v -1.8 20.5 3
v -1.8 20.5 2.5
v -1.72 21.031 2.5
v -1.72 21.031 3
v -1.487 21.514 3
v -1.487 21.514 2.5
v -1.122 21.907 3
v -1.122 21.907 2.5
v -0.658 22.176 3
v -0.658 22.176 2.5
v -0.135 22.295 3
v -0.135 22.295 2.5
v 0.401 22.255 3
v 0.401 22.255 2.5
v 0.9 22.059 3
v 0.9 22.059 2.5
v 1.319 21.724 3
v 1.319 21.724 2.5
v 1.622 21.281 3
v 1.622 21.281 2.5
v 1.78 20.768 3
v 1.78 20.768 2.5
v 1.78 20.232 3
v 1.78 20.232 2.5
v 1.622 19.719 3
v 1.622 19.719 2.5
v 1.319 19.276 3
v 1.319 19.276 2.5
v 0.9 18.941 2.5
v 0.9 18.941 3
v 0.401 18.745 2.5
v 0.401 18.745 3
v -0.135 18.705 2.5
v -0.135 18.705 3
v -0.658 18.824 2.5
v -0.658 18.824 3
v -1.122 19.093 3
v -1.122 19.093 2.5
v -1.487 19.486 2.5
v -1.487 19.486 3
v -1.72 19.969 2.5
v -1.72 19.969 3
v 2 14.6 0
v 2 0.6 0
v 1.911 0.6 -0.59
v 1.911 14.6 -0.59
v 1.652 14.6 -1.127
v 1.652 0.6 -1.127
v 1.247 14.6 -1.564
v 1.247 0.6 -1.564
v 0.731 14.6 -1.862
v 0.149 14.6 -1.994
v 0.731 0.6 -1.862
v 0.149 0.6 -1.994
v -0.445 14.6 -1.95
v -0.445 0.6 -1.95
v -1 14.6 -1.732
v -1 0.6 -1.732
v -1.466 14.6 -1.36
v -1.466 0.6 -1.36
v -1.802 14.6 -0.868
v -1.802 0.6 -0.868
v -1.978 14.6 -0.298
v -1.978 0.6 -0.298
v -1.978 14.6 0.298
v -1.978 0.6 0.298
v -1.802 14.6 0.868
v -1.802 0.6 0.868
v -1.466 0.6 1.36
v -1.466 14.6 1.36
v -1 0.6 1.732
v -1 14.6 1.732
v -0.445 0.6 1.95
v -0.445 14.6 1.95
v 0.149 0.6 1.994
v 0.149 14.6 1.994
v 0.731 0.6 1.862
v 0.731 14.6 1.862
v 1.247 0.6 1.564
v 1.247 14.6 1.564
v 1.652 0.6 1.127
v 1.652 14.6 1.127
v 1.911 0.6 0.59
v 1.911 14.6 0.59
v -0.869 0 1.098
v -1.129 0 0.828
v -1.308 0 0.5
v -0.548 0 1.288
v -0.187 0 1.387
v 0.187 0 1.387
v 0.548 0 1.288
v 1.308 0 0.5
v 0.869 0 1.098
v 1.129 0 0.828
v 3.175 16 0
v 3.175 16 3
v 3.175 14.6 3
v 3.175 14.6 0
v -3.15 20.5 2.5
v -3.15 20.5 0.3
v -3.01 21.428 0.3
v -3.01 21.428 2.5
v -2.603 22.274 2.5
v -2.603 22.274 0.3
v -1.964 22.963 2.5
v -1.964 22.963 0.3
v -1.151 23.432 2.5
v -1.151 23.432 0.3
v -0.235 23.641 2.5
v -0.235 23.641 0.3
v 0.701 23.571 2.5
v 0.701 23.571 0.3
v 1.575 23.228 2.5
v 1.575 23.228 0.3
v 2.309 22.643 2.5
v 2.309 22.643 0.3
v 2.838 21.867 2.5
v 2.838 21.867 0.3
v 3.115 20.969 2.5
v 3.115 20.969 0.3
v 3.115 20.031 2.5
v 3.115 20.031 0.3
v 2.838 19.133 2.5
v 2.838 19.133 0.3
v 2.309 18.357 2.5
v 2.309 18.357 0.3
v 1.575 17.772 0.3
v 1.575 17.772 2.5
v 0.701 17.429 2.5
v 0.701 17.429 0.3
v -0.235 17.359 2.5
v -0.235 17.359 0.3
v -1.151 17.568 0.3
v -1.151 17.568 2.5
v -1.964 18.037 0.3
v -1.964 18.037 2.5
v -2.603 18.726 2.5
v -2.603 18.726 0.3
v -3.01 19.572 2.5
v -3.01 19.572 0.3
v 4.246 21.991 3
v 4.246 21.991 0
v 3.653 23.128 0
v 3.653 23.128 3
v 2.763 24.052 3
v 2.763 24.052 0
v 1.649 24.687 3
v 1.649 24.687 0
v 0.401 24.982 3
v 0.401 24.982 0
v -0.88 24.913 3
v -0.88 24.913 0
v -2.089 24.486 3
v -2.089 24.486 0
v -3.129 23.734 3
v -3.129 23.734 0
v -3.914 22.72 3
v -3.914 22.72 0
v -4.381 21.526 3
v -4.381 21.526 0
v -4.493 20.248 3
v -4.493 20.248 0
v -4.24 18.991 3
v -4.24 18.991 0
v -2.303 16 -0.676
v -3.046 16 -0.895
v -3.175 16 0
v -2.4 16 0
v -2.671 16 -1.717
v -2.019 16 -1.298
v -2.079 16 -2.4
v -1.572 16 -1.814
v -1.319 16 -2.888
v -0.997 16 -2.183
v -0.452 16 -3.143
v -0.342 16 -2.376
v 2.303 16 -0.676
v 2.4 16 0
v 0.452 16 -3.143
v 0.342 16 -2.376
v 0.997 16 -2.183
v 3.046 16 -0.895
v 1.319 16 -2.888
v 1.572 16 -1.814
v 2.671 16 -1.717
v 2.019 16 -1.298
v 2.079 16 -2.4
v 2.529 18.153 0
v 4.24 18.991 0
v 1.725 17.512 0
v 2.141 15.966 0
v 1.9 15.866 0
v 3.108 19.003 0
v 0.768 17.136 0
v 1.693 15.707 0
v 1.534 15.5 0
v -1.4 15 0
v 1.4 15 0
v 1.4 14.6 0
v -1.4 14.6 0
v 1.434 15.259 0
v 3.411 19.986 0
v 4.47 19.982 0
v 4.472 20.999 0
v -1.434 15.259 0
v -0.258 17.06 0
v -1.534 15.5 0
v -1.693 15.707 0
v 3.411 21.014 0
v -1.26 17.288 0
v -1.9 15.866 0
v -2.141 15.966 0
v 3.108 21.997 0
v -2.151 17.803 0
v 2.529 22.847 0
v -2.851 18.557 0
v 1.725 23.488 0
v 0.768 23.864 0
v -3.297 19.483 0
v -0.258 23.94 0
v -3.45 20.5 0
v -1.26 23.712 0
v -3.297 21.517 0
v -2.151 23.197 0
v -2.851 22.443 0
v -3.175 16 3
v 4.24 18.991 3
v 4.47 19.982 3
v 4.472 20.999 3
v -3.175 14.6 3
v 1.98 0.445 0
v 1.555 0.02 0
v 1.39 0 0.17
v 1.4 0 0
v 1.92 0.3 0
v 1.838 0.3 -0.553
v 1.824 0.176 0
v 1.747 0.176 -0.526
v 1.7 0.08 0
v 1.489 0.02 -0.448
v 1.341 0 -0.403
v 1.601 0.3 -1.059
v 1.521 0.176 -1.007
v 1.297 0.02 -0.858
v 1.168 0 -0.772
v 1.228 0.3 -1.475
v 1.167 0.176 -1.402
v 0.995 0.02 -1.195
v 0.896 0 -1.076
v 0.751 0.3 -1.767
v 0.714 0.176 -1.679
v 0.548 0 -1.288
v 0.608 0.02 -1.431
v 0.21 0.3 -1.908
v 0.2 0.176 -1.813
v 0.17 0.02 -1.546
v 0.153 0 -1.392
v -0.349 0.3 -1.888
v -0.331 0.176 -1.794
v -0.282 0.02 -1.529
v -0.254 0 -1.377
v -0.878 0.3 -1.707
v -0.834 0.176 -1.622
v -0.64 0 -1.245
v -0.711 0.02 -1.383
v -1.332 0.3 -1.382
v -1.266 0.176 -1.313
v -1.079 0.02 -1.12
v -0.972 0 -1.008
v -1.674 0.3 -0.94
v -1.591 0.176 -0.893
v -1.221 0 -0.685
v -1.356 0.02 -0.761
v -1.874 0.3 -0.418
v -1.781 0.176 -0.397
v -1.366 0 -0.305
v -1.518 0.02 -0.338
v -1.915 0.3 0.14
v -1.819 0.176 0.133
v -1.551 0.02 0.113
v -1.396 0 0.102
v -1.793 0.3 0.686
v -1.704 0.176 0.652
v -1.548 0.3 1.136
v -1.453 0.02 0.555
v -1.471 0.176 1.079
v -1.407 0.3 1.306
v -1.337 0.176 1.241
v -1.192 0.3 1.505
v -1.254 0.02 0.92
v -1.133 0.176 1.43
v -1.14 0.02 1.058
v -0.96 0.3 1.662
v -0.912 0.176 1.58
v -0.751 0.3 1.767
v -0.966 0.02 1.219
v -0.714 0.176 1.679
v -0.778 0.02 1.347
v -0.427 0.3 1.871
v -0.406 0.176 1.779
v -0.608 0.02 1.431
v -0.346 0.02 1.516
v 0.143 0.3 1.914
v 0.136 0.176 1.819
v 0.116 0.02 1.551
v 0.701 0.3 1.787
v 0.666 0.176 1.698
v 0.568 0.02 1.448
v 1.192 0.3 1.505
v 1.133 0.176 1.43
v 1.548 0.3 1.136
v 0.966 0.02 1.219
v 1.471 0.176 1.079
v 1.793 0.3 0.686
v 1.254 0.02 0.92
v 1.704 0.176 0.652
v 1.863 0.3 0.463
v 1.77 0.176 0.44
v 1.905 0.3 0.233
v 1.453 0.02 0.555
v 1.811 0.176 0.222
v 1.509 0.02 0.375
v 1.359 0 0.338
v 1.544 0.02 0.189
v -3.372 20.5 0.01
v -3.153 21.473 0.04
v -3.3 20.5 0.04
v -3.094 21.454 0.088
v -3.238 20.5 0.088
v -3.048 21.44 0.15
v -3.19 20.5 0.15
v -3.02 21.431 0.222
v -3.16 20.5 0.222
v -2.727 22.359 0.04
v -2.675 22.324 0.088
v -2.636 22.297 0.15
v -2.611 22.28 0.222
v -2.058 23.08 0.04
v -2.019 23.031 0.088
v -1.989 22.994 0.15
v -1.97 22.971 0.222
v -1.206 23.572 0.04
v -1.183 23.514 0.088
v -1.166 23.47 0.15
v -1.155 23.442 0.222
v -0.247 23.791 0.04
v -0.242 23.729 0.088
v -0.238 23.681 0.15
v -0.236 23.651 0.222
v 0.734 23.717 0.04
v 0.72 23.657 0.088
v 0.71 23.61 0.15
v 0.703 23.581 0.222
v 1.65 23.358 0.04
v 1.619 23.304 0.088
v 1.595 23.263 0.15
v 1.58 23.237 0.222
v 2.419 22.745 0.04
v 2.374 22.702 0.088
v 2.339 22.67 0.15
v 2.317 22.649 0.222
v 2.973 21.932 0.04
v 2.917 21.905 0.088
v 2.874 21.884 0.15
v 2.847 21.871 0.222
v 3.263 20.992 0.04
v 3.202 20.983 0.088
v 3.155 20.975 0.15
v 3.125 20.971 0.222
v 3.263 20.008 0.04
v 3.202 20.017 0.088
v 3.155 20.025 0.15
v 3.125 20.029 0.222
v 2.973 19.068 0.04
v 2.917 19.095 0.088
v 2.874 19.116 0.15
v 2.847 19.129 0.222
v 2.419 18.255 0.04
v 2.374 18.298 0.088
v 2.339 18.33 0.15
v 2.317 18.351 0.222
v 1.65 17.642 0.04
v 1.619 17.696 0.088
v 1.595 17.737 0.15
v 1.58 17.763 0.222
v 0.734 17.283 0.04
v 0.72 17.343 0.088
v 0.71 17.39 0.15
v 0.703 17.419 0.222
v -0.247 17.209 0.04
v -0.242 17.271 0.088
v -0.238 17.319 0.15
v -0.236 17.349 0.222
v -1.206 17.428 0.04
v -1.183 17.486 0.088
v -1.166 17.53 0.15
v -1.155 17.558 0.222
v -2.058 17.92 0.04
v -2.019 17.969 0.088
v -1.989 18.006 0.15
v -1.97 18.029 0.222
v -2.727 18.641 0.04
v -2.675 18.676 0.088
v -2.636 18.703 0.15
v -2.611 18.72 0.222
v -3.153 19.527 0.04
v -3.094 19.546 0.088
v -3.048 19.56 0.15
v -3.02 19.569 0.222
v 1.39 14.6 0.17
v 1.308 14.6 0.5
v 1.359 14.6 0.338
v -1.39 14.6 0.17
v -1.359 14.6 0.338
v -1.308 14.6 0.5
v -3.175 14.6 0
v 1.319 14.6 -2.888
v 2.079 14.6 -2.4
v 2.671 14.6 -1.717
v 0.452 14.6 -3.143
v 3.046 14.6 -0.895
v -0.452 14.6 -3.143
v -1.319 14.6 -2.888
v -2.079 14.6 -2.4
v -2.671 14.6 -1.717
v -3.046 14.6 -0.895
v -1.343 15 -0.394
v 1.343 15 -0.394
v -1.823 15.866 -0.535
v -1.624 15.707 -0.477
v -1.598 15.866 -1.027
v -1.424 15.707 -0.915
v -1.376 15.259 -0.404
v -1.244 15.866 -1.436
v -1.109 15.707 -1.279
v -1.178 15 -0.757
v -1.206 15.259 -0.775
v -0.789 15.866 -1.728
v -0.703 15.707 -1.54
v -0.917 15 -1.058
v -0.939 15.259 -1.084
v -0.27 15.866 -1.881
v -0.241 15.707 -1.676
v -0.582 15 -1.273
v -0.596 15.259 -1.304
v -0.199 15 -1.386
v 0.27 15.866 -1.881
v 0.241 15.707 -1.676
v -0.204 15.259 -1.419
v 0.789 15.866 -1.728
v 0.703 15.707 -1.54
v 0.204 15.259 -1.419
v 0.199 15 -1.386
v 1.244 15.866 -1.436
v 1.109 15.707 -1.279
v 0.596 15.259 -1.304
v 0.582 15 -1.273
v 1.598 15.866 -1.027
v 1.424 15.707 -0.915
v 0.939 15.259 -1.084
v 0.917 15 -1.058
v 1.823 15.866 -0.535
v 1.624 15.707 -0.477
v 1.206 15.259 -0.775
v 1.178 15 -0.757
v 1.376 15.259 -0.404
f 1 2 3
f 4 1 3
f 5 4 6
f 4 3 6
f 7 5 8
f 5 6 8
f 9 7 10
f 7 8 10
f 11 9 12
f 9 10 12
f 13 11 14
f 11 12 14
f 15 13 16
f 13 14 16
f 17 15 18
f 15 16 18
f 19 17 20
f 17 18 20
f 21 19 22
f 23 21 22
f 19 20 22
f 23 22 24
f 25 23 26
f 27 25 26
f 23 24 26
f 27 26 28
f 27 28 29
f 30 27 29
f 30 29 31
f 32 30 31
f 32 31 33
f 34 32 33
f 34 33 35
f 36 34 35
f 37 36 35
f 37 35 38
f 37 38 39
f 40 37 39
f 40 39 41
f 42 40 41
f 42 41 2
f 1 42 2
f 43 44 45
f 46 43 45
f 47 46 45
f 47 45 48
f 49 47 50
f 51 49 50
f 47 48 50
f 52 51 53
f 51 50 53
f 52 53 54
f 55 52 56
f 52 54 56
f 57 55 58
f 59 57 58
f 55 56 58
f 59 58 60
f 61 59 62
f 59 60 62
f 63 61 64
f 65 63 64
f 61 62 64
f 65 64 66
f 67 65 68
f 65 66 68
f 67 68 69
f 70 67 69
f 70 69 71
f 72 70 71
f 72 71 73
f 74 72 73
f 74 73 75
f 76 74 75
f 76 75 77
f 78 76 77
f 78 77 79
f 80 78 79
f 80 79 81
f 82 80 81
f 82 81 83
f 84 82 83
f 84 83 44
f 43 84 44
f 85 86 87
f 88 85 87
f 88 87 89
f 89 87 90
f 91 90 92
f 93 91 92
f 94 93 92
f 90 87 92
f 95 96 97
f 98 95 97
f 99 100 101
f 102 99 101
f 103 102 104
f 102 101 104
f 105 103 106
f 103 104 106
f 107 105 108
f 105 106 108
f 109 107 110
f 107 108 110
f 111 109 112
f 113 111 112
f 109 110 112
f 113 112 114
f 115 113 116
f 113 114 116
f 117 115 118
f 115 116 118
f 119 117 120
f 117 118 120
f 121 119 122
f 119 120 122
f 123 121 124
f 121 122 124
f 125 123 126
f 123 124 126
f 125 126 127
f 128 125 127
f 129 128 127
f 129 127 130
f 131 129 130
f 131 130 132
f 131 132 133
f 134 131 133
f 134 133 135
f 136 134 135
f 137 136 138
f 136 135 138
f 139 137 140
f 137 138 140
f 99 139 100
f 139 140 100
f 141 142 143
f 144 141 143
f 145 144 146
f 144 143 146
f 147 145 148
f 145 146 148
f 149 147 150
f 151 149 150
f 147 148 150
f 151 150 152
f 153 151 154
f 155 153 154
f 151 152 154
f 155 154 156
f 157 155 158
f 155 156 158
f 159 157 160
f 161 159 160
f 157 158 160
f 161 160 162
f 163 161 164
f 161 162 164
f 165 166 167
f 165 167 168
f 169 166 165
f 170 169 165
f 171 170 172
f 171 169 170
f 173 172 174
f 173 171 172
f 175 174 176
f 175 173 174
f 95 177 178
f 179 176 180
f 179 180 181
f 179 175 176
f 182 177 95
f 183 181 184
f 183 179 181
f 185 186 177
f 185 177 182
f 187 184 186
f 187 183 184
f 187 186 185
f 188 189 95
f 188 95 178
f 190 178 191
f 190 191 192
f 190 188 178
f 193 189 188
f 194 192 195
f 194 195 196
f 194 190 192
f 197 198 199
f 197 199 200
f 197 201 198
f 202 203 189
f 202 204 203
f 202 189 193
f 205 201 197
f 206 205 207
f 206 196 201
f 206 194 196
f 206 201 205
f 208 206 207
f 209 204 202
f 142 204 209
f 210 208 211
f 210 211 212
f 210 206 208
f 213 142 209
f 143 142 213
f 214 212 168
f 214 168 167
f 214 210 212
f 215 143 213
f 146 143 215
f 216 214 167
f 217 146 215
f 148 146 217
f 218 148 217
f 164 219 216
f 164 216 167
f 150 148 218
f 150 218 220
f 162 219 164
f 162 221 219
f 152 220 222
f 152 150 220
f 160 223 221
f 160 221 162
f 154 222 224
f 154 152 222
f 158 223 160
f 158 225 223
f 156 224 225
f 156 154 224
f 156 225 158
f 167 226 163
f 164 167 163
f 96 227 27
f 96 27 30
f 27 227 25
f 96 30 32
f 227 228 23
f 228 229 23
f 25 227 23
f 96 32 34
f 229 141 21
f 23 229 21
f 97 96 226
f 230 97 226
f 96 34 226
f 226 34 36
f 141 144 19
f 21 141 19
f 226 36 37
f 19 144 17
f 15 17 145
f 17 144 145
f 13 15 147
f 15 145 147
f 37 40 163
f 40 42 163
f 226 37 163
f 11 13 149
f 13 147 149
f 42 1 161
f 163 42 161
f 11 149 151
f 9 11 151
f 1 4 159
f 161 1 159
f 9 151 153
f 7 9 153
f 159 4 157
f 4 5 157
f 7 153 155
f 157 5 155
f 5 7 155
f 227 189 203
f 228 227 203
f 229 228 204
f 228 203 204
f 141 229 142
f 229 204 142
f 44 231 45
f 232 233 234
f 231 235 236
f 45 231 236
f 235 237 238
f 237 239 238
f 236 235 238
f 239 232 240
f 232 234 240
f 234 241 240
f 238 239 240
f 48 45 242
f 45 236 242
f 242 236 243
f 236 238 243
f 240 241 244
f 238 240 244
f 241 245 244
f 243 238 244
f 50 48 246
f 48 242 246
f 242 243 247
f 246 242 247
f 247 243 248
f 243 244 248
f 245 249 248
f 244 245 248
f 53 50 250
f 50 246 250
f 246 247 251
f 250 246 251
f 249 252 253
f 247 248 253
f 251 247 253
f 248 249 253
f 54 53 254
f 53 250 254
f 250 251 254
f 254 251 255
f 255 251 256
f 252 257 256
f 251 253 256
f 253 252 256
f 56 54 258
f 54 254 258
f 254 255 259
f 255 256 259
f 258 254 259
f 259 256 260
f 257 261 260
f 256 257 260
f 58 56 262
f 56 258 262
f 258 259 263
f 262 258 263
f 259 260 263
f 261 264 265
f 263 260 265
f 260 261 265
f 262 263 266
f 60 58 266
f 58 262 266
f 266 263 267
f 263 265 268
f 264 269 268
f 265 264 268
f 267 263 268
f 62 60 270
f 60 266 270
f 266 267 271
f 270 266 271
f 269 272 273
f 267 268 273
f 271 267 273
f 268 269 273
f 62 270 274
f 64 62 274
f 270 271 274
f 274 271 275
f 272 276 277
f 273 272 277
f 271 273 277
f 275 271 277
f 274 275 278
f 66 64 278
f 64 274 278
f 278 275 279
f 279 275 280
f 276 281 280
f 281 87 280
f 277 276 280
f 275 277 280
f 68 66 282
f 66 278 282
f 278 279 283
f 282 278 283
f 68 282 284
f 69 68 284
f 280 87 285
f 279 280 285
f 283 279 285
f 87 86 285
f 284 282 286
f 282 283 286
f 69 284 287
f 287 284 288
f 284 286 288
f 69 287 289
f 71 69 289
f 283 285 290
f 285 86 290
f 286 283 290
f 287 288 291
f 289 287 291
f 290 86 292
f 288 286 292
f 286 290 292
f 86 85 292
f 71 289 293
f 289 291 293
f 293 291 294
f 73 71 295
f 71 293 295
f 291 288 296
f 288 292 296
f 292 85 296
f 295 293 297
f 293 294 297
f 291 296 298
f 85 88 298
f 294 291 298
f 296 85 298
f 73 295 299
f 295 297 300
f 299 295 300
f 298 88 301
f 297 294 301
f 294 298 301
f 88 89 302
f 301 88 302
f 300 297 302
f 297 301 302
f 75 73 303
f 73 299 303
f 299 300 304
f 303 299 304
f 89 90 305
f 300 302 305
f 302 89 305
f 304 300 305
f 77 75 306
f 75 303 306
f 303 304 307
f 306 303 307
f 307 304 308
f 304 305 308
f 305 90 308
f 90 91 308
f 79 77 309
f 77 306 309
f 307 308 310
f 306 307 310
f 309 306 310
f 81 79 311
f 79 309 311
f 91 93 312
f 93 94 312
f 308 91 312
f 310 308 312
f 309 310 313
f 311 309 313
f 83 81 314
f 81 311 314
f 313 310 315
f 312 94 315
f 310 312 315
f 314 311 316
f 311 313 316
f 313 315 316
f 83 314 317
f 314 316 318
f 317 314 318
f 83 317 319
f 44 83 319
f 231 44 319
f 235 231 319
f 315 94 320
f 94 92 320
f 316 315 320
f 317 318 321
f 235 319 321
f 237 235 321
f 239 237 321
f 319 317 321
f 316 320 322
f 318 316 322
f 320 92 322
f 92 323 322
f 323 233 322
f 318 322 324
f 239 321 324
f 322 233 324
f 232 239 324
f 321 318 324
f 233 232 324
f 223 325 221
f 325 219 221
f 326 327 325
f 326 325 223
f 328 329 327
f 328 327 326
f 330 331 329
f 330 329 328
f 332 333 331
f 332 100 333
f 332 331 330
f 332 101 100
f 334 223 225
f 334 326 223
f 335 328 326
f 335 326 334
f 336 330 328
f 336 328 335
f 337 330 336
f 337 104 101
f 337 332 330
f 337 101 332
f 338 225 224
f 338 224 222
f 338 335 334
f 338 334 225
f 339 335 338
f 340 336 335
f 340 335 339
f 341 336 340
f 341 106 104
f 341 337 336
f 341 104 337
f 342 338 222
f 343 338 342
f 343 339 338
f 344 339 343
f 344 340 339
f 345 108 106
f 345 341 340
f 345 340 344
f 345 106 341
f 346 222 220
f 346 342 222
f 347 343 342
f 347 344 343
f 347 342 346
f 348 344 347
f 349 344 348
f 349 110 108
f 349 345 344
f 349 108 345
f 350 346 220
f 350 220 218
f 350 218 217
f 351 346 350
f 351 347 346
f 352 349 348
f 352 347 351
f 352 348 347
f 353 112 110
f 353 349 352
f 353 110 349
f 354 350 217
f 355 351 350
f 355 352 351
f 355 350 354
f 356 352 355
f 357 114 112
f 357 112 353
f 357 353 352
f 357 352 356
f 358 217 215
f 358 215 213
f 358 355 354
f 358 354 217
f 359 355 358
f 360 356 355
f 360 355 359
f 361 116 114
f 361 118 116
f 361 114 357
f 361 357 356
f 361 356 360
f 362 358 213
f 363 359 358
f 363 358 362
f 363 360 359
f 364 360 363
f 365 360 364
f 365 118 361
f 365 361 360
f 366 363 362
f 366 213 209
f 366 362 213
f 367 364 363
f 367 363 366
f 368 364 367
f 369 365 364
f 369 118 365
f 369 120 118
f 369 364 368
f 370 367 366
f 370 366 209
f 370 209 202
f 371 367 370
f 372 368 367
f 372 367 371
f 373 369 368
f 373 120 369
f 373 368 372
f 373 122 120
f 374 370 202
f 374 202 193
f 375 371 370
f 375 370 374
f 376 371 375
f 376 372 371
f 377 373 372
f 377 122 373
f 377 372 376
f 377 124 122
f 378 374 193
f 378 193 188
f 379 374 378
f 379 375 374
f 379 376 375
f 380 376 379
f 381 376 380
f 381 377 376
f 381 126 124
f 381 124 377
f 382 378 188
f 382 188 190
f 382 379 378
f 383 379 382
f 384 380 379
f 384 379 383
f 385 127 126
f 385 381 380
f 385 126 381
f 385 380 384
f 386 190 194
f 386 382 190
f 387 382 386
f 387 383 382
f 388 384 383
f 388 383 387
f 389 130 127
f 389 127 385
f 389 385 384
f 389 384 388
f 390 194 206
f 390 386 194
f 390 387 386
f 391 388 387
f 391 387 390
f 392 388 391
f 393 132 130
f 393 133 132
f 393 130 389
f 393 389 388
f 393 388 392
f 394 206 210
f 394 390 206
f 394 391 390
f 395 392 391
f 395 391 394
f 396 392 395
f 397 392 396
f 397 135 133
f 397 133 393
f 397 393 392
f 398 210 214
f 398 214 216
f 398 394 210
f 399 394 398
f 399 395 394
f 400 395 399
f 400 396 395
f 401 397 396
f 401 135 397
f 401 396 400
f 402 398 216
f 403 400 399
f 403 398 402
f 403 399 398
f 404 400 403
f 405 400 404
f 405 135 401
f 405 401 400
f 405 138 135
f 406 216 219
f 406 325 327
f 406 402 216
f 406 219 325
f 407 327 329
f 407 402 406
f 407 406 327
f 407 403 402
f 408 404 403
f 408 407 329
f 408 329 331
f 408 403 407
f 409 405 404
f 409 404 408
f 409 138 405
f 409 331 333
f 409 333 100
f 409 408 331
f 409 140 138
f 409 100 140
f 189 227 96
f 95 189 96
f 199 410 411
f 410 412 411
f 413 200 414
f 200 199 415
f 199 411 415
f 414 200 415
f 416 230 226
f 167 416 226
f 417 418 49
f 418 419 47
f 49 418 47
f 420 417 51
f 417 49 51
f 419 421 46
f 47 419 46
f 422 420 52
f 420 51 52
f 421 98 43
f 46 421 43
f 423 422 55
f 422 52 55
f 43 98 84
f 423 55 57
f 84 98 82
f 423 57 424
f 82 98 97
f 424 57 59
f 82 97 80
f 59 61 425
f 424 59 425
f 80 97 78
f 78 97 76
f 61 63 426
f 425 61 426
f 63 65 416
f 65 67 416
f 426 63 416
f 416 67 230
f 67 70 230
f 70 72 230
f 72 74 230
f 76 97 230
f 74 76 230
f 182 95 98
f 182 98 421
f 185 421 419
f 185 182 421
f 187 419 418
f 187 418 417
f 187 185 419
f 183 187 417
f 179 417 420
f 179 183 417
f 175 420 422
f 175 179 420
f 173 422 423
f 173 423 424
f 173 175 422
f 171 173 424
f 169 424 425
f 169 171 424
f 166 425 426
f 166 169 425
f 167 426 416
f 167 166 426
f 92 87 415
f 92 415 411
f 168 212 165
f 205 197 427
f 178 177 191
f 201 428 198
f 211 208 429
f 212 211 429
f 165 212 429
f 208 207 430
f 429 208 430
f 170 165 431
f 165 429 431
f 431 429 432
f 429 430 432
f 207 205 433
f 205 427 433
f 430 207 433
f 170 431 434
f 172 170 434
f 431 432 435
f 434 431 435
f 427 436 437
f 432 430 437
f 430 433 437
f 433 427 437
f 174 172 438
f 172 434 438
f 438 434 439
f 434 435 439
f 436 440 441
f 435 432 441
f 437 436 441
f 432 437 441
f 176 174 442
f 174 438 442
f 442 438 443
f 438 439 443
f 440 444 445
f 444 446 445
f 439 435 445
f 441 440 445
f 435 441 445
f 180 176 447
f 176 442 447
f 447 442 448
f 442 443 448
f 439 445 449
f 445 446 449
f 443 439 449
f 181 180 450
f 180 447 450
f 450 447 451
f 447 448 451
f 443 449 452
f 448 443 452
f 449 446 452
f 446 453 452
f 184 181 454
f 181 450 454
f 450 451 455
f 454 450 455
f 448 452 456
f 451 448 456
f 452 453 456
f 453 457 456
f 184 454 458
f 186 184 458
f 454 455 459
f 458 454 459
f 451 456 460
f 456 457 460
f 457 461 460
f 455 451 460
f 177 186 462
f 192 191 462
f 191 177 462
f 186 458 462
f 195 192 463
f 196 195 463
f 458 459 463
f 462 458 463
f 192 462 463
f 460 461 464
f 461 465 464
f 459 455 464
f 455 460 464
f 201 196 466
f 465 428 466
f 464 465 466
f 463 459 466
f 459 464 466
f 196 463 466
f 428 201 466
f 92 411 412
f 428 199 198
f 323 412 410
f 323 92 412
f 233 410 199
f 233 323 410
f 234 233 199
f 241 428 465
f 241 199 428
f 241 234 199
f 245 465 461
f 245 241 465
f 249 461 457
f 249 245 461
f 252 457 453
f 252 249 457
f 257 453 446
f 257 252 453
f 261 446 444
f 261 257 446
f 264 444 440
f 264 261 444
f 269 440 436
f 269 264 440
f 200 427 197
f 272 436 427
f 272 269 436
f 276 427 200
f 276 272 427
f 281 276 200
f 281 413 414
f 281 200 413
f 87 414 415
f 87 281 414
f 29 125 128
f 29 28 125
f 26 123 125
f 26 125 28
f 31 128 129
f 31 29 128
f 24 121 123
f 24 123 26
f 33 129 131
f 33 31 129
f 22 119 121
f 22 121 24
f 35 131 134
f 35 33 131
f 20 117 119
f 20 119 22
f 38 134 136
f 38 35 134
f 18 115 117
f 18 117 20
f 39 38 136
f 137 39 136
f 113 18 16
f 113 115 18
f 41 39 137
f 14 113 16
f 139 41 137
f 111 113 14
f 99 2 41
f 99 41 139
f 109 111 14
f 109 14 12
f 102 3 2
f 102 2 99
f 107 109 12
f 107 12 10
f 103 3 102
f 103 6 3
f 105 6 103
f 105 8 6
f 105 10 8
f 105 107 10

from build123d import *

# Parameters (mm, degrees)
SKETCH_1_R               = 2
EXTRUDE_1_DEPTH          = 16
EXTRUDE_2_DEPTH          = 3
SKETCH_4_R               = 3.15
CUT_EXTRUDE_6_DEPTH      = 2.5
FILLET_3_R               = 0.6
SKETCH_7_R               = 3.175
EXTRUDE_3_DEPTH          = 1.4
CUT_EXTRUDE_9_DEPTH      = 1
CUT_EXTRUDE_9_DEPTH_BACK = 26
FILLET_6_R               = 1
EXTRUDE_5_DEPTH          = 3
FILLET_7_R               = 0.3
CUT_EXTRUDE_10_REACH     = 2.675
SKETCH_13_R              = 1.8
CUT_EXTRUDE_11_REACH     = 18
SKETCH_14_W              = 2.079062288
SKETCH_14_H              = 0.49177122


with BuildPart() as part:
    # 草图1 → 凸台-拉伸1 (new body)
    with BuildSketch(Plane(origin=(0, 0, 0), x_dir=(1, 0, 0), z_dir=(0, 1, 0))):
        Circle(SKETCH_1_R)
    extrude(amount=EXTRUDE_1_DEPTH)

    # 圆角3
    fillet_3_edges = [part.edges().sort_by_distance(p)[0] for p in [
        (-2, 0, 0),
    ]]
    fillet(fillet_3_edges, radius=FILLET_3_R)

    # 草图7 → 凸台-拉伸3 (add)
    with BuildSketch(Plane(origin=(0, 16, 0), x_dir=(1, 0, 0), z_dir=(0, 1, 0))):
        Circle(SKETCH_7_R)
    extrude(amount=-EXTRUDE_3_DEPTH)

    # 草图10 → 切除-拉伸9 (cut, two sides)
    with BuildSketch(Plane.XZ) as cut_extrude_9_sk:
        with BuildLine():
            Line((-1.307669683, 0.5), (1.307669683, 0.5))
            ThreePointArc((1.307669683, 0.5), (0, -1.4), (-1.307669683, 0.5))
        make_face()
    extrude(amount=CUT_EXTRUDE_9_DEPTH, mode=Mode.SUBTRACT)
    extrude(cut_extrude_9_sk.sketch, amount=-CUT_EXTRUDE_9_DEPTH_BACK, mode=Mode.SUBTRACT)

    # 圆角6
    fillet_6_edges = [part.edges().sort_by_distance(p)[0] for p in [
        (0, 16, -1.4),
    ]]
    fillet(fillet_6_edges, radius=FILLET_6_R)



with BuildPart() as body_2:
    # 草图2 → 凸台-拉伸2 (new body)
    with BuildSketch(Plane.XY):
        with BuildLine():
            ThreePointArc((4.245738578, 21.991208882), (-3.671541908, 23.101880092), (0, 16))
            ThreePointArc((0, 16), (3.671541908, 17.898119908), (4.245738578, 21.991208882))
        make_face()
    extrude(amount=EXTRUDE_2_DEPTH)

    # 草图4 → 切除-拉伸6 (cut)
    with BuildSketch(Plane(origin=(0, 0, 0), x_dir=(-1, 0, 0), z_dir=(0, 0, -1))):
        with Locations((0, 20.5)):
            Circle(SKETCH_4_R)
    extrude(amount=-CUT_EXTRUDE_6_DEPTH, mode=Mode.SUBTRACT)


with BuildPart() as part_1:
    add(part.part)

    add(body_2.part)  # 凸台-拉伸5 merges body 2
    # 草图12 → 凸台-拉伸5 (add)
    with BuildSketch(Plane.XY.offset(3)):
        with BuildLine():
            Line((-3.175, 16), (-4.239526881, 18.991221744))
            ThreePointArc((-4.239526881, 18.991221744), (0, 16), (4.239526881, 18.991221744))
            Line((4.239526881, 18.991221744), (3.175, 16))
            Line((3.175, 16), (3.175, 14.6))
            Line((3.175, 14.6), (-3.175, 14.6))
            Line((-3.175, 14.6), (-3.175, 16))
        make_face()
    extrude(amount=-EXTRUDE_5_DEPTH)

    # 圆角7
    fillet_7_edges = [part_1.edges().sort_by_distance(p)[0] for p in [
        (3.15, 20.5, 0),
    ]]
    fillet(fillet_7_edges, radius=FILLET_7_R)

    # 草图13 → 切除-拉伸10 (cut, up to next)
    with BuildSketch(Plane(origin=(0, 0, 2.5), x_dir=(-1, 0, 0), z_dir=(0, 0, -1)), mode=Mode.PRIVATE) as cut_extrude_10_sk1:
        with Locations((0, 20.5)):
            Circle(SKETCH_13_R)
    cut_extrude_10_tool1 = extrude(cut_extrude_10_sk1.sketch, amount=-CUT_EXTRUDE_10_REACH, mode=Mode.PRIVATE) & part_1.part
    add(cut_extrude_10_tool1.solids().sort_by_distance((0, 20.5, 2.5))[0], mode=Mode.SUBTRACT)

    # 草图14 → 切除-拉伸11 (cut, up to next)
    with BuildSketch(Plane(origin=(0, 16, 0), x_dir=(1, 0, 0), z_dir=(0, 1, 0)), mode=Mode.PRIVATE) as cut_extrude_11_sk1:
        with Locations((0, -3.24588561)):
            Rectangle(SKETCH_14_W, SKETCH_14_H)
    cut_extrude_11_tool1 = extrude(cut_extrude_11_sk1.sketch, amount=-CUT_EXTRUDE_11_REACH, mode=Mode.PRIVATE) & part_1.part
    add(cut_extrude_11_tool1.solids().sort_by_distance((0, 16, 3.245886))[0], mode=Mode.SUBTRACT)


solid = part_1.part
